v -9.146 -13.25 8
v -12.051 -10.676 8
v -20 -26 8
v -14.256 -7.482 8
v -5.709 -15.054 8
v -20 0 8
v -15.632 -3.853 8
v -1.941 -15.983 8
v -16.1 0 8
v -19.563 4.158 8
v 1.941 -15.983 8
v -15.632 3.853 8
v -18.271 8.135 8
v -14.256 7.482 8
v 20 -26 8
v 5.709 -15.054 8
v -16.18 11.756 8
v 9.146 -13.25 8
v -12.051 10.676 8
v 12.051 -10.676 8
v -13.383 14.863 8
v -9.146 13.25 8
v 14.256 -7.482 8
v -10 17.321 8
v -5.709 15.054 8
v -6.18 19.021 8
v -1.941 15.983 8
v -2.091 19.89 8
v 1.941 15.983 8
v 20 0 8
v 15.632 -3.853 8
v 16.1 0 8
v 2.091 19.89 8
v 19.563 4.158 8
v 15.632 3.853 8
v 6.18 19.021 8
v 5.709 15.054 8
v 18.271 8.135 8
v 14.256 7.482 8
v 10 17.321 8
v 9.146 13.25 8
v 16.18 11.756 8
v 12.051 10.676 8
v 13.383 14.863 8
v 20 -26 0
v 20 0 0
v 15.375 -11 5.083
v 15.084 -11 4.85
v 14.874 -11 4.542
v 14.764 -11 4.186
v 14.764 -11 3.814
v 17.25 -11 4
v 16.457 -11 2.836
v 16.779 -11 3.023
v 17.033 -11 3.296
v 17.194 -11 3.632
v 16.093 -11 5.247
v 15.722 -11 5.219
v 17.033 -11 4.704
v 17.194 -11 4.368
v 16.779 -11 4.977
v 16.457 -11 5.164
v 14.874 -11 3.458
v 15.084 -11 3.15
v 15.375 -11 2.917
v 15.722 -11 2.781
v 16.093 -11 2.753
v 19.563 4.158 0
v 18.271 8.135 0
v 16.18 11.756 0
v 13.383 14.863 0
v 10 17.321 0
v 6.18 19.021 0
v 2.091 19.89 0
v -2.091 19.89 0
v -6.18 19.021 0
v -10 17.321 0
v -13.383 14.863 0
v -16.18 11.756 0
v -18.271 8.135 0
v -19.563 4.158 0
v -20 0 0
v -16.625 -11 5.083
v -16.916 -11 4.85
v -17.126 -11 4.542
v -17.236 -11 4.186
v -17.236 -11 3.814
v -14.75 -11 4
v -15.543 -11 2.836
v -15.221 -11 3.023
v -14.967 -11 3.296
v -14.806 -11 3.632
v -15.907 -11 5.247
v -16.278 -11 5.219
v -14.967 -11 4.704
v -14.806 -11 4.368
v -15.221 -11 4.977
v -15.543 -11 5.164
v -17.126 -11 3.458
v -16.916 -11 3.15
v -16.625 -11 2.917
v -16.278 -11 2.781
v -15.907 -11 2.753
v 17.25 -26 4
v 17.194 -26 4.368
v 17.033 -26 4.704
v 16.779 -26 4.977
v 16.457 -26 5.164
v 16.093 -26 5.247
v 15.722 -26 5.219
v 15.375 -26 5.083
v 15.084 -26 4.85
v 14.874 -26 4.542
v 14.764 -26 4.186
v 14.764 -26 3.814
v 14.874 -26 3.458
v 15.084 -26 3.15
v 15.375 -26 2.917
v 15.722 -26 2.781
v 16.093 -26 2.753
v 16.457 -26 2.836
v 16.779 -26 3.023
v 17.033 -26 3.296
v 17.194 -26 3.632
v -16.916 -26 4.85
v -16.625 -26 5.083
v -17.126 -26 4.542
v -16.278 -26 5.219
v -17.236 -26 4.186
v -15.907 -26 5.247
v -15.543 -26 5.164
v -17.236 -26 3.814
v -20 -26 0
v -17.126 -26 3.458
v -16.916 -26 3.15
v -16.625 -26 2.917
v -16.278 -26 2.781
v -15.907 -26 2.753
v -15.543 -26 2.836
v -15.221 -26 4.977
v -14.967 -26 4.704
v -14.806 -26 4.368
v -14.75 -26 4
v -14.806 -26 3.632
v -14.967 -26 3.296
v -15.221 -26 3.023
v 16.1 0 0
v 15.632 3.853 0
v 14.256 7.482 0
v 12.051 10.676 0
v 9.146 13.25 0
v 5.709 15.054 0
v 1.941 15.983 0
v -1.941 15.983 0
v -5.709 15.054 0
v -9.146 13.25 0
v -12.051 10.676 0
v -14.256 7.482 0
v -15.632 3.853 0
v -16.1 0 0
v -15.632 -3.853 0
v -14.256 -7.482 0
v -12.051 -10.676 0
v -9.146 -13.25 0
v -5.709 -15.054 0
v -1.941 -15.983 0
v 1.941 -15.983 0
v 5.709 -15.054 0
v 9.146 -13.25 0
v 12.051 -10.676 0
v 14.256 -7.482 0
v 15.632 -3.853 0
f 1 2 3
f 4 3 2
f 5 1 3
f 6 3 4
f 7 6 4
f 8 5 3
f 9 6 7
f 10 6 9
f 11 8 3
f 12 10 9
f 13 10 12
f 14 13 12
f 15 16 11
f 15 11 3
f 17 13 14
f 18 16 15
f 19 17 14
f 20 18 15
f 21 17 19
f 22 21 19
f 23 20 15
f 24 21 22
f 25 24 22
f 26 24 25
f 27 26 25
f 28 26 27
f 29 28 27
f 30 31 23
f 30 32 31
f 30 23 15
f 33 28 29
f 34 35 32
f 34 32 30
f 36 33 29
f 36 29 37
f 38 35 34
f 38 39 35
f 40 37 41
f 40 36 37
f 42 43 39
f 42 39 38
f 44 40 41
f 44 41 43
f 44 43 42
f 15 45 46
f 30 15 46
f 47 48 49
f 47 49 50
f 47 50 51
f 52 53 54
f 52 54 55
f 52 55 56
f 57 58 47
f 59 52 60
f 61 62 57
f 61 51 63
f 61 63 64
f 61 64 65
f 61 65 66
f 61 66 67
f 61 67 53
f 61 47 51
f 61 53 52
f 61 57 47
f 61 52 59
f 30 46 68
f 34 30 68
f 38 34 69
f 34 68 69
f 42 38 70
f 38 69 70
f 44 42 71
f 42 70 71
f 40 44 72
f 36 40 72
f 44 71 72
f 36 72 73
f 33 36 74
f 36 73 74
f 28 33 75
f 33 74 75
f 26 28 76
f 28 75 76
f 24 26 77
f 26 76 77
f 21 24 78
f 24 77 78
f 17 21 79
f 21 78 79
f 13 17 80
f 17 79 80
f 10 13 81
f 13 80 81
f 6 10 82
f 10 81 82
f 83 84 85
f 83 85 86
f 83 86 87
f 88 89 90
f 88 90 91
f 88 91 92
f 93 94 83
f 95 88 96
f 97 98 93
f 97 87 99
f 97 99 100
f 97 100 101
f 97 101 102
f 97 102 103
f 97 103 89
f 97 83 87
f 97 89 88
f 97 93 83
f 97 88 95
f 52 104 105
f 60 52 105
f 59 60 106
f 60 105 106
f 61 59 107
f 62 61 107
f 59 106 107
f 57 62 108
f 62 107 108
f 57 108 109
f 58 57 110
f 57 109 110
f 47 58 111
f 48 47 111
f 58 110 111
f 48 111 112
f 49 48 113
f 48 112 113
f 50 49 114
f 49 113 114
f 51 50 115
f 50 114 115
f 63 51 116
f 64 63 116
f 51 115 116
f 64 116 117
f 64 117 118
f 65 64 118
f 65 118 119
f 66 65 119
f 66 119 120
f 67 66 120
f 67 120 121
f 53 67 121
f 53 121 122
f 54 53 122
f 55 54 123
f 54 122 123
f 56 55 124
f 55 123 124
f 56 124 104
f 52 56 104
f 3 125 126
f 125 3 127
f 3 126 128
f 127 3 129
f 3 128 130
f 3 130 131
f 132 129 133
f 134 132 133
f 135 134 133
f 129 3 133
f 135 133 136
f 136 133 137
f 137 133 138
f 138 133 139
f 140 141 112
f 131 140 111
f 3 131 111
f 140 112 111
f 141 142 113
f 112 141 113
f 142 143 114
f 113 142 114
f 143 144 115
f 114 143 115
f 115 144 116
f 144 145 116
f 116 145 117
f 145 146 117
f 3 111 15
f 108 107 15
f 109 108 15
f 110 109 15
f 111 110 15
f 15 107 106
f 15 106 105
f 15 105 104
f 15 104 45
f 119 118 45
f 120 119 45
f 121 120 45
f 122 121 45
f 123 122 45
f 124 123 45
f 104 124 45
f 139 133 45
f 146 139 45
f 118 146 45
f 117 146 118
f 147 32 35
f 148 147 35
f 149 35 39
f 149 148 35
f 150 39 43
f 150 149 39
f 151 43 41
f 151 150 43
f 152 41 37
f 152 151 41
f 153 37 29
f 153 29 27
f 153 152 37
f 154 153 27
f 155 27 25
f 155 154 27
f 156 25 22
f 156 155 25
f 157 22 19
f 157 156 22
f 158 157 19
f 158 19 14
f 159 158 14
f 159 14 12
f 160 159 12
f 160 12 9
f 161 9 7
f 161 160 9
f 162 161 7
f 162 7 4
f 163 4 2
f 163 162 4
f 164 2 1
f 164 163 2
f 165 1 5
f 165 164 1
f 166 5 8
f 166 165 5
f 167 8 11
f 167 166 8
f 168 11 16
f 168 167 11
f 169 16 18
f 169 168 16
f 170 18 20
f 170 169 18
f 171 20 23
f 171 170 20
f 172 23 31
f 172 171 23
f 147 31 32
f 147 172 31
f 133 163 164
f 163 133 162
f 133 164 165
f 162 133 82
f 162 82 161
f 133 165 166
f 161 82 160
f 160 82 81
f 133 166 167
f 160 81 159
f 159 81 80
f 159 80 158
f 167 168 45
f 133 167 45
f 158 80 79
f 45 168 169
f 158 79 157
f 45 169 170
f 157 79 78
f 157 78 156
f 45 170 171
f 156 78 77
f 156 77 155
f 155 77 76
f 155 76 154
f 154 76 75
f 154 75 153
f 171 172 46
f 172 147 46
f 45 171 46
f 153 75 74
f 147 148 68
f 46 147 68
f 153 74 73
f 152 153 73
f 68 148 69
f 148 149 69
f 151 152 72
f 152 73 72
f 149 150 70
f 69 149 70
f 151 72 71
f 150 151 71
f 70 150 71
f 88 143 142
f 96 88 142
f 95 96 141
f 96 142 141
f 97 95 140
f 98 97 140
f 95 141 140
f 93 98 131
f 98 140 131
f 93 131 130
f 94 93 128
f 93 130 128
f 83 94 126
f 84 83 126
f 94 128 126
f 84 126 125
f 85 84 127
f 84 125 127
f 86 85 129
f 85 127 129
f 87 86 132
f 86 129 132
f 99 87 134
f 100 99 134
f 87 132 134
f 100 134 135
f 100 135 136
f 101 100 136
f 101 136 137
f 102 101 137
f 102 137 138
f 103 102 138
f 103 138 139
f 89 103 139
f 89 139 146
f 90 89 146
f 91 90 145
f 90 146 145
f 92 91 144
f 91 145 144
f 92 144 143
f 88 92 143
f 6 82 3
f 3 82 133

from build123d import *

# Parameters (mm, degrees)
ESQUISSE1_R             = 16.1
BOSS_EXTRU_1_DEPTH      = 8
ESQUISSE2_R             = 1.25
ENL_V_MAT_EXTRU_1_DEPTH = 15


with BuildPart() as part:
    # Esquisse1 → Boss.-Extru.1 (new body)
    with BuildSketch(Plane.XY):
        with BuildLine():
            Line((-20, 0), (-20, -26))
            Line((-20, -26), (20, -26))
            Line((20, -26), (20, 0))
            ThreePointArc((20, 0), (0, 20), (-20, 0))
        make_face()
        Circle(ESQUISSE1_R, mode=Mode.SUBTRACT)
    extrude(amount=BOSS_EXTRU_1_DEPTH)

    # Esquisse2 → Enlèv. mat.-Extru.1 (cut)
    with BuildSketch(Plane.XZ.offset(26)):
        with Locations((-16, 4)):
            Circle(ESQUISSE2_R)
        with Locations((16, 4)):
            Circle(ESQUISSE2_R)
    extrude(amount=-ENL_V_MAT_EXTRU_1_DEPTH, mode=Mode.SUBTRACT)


solid = part.part
